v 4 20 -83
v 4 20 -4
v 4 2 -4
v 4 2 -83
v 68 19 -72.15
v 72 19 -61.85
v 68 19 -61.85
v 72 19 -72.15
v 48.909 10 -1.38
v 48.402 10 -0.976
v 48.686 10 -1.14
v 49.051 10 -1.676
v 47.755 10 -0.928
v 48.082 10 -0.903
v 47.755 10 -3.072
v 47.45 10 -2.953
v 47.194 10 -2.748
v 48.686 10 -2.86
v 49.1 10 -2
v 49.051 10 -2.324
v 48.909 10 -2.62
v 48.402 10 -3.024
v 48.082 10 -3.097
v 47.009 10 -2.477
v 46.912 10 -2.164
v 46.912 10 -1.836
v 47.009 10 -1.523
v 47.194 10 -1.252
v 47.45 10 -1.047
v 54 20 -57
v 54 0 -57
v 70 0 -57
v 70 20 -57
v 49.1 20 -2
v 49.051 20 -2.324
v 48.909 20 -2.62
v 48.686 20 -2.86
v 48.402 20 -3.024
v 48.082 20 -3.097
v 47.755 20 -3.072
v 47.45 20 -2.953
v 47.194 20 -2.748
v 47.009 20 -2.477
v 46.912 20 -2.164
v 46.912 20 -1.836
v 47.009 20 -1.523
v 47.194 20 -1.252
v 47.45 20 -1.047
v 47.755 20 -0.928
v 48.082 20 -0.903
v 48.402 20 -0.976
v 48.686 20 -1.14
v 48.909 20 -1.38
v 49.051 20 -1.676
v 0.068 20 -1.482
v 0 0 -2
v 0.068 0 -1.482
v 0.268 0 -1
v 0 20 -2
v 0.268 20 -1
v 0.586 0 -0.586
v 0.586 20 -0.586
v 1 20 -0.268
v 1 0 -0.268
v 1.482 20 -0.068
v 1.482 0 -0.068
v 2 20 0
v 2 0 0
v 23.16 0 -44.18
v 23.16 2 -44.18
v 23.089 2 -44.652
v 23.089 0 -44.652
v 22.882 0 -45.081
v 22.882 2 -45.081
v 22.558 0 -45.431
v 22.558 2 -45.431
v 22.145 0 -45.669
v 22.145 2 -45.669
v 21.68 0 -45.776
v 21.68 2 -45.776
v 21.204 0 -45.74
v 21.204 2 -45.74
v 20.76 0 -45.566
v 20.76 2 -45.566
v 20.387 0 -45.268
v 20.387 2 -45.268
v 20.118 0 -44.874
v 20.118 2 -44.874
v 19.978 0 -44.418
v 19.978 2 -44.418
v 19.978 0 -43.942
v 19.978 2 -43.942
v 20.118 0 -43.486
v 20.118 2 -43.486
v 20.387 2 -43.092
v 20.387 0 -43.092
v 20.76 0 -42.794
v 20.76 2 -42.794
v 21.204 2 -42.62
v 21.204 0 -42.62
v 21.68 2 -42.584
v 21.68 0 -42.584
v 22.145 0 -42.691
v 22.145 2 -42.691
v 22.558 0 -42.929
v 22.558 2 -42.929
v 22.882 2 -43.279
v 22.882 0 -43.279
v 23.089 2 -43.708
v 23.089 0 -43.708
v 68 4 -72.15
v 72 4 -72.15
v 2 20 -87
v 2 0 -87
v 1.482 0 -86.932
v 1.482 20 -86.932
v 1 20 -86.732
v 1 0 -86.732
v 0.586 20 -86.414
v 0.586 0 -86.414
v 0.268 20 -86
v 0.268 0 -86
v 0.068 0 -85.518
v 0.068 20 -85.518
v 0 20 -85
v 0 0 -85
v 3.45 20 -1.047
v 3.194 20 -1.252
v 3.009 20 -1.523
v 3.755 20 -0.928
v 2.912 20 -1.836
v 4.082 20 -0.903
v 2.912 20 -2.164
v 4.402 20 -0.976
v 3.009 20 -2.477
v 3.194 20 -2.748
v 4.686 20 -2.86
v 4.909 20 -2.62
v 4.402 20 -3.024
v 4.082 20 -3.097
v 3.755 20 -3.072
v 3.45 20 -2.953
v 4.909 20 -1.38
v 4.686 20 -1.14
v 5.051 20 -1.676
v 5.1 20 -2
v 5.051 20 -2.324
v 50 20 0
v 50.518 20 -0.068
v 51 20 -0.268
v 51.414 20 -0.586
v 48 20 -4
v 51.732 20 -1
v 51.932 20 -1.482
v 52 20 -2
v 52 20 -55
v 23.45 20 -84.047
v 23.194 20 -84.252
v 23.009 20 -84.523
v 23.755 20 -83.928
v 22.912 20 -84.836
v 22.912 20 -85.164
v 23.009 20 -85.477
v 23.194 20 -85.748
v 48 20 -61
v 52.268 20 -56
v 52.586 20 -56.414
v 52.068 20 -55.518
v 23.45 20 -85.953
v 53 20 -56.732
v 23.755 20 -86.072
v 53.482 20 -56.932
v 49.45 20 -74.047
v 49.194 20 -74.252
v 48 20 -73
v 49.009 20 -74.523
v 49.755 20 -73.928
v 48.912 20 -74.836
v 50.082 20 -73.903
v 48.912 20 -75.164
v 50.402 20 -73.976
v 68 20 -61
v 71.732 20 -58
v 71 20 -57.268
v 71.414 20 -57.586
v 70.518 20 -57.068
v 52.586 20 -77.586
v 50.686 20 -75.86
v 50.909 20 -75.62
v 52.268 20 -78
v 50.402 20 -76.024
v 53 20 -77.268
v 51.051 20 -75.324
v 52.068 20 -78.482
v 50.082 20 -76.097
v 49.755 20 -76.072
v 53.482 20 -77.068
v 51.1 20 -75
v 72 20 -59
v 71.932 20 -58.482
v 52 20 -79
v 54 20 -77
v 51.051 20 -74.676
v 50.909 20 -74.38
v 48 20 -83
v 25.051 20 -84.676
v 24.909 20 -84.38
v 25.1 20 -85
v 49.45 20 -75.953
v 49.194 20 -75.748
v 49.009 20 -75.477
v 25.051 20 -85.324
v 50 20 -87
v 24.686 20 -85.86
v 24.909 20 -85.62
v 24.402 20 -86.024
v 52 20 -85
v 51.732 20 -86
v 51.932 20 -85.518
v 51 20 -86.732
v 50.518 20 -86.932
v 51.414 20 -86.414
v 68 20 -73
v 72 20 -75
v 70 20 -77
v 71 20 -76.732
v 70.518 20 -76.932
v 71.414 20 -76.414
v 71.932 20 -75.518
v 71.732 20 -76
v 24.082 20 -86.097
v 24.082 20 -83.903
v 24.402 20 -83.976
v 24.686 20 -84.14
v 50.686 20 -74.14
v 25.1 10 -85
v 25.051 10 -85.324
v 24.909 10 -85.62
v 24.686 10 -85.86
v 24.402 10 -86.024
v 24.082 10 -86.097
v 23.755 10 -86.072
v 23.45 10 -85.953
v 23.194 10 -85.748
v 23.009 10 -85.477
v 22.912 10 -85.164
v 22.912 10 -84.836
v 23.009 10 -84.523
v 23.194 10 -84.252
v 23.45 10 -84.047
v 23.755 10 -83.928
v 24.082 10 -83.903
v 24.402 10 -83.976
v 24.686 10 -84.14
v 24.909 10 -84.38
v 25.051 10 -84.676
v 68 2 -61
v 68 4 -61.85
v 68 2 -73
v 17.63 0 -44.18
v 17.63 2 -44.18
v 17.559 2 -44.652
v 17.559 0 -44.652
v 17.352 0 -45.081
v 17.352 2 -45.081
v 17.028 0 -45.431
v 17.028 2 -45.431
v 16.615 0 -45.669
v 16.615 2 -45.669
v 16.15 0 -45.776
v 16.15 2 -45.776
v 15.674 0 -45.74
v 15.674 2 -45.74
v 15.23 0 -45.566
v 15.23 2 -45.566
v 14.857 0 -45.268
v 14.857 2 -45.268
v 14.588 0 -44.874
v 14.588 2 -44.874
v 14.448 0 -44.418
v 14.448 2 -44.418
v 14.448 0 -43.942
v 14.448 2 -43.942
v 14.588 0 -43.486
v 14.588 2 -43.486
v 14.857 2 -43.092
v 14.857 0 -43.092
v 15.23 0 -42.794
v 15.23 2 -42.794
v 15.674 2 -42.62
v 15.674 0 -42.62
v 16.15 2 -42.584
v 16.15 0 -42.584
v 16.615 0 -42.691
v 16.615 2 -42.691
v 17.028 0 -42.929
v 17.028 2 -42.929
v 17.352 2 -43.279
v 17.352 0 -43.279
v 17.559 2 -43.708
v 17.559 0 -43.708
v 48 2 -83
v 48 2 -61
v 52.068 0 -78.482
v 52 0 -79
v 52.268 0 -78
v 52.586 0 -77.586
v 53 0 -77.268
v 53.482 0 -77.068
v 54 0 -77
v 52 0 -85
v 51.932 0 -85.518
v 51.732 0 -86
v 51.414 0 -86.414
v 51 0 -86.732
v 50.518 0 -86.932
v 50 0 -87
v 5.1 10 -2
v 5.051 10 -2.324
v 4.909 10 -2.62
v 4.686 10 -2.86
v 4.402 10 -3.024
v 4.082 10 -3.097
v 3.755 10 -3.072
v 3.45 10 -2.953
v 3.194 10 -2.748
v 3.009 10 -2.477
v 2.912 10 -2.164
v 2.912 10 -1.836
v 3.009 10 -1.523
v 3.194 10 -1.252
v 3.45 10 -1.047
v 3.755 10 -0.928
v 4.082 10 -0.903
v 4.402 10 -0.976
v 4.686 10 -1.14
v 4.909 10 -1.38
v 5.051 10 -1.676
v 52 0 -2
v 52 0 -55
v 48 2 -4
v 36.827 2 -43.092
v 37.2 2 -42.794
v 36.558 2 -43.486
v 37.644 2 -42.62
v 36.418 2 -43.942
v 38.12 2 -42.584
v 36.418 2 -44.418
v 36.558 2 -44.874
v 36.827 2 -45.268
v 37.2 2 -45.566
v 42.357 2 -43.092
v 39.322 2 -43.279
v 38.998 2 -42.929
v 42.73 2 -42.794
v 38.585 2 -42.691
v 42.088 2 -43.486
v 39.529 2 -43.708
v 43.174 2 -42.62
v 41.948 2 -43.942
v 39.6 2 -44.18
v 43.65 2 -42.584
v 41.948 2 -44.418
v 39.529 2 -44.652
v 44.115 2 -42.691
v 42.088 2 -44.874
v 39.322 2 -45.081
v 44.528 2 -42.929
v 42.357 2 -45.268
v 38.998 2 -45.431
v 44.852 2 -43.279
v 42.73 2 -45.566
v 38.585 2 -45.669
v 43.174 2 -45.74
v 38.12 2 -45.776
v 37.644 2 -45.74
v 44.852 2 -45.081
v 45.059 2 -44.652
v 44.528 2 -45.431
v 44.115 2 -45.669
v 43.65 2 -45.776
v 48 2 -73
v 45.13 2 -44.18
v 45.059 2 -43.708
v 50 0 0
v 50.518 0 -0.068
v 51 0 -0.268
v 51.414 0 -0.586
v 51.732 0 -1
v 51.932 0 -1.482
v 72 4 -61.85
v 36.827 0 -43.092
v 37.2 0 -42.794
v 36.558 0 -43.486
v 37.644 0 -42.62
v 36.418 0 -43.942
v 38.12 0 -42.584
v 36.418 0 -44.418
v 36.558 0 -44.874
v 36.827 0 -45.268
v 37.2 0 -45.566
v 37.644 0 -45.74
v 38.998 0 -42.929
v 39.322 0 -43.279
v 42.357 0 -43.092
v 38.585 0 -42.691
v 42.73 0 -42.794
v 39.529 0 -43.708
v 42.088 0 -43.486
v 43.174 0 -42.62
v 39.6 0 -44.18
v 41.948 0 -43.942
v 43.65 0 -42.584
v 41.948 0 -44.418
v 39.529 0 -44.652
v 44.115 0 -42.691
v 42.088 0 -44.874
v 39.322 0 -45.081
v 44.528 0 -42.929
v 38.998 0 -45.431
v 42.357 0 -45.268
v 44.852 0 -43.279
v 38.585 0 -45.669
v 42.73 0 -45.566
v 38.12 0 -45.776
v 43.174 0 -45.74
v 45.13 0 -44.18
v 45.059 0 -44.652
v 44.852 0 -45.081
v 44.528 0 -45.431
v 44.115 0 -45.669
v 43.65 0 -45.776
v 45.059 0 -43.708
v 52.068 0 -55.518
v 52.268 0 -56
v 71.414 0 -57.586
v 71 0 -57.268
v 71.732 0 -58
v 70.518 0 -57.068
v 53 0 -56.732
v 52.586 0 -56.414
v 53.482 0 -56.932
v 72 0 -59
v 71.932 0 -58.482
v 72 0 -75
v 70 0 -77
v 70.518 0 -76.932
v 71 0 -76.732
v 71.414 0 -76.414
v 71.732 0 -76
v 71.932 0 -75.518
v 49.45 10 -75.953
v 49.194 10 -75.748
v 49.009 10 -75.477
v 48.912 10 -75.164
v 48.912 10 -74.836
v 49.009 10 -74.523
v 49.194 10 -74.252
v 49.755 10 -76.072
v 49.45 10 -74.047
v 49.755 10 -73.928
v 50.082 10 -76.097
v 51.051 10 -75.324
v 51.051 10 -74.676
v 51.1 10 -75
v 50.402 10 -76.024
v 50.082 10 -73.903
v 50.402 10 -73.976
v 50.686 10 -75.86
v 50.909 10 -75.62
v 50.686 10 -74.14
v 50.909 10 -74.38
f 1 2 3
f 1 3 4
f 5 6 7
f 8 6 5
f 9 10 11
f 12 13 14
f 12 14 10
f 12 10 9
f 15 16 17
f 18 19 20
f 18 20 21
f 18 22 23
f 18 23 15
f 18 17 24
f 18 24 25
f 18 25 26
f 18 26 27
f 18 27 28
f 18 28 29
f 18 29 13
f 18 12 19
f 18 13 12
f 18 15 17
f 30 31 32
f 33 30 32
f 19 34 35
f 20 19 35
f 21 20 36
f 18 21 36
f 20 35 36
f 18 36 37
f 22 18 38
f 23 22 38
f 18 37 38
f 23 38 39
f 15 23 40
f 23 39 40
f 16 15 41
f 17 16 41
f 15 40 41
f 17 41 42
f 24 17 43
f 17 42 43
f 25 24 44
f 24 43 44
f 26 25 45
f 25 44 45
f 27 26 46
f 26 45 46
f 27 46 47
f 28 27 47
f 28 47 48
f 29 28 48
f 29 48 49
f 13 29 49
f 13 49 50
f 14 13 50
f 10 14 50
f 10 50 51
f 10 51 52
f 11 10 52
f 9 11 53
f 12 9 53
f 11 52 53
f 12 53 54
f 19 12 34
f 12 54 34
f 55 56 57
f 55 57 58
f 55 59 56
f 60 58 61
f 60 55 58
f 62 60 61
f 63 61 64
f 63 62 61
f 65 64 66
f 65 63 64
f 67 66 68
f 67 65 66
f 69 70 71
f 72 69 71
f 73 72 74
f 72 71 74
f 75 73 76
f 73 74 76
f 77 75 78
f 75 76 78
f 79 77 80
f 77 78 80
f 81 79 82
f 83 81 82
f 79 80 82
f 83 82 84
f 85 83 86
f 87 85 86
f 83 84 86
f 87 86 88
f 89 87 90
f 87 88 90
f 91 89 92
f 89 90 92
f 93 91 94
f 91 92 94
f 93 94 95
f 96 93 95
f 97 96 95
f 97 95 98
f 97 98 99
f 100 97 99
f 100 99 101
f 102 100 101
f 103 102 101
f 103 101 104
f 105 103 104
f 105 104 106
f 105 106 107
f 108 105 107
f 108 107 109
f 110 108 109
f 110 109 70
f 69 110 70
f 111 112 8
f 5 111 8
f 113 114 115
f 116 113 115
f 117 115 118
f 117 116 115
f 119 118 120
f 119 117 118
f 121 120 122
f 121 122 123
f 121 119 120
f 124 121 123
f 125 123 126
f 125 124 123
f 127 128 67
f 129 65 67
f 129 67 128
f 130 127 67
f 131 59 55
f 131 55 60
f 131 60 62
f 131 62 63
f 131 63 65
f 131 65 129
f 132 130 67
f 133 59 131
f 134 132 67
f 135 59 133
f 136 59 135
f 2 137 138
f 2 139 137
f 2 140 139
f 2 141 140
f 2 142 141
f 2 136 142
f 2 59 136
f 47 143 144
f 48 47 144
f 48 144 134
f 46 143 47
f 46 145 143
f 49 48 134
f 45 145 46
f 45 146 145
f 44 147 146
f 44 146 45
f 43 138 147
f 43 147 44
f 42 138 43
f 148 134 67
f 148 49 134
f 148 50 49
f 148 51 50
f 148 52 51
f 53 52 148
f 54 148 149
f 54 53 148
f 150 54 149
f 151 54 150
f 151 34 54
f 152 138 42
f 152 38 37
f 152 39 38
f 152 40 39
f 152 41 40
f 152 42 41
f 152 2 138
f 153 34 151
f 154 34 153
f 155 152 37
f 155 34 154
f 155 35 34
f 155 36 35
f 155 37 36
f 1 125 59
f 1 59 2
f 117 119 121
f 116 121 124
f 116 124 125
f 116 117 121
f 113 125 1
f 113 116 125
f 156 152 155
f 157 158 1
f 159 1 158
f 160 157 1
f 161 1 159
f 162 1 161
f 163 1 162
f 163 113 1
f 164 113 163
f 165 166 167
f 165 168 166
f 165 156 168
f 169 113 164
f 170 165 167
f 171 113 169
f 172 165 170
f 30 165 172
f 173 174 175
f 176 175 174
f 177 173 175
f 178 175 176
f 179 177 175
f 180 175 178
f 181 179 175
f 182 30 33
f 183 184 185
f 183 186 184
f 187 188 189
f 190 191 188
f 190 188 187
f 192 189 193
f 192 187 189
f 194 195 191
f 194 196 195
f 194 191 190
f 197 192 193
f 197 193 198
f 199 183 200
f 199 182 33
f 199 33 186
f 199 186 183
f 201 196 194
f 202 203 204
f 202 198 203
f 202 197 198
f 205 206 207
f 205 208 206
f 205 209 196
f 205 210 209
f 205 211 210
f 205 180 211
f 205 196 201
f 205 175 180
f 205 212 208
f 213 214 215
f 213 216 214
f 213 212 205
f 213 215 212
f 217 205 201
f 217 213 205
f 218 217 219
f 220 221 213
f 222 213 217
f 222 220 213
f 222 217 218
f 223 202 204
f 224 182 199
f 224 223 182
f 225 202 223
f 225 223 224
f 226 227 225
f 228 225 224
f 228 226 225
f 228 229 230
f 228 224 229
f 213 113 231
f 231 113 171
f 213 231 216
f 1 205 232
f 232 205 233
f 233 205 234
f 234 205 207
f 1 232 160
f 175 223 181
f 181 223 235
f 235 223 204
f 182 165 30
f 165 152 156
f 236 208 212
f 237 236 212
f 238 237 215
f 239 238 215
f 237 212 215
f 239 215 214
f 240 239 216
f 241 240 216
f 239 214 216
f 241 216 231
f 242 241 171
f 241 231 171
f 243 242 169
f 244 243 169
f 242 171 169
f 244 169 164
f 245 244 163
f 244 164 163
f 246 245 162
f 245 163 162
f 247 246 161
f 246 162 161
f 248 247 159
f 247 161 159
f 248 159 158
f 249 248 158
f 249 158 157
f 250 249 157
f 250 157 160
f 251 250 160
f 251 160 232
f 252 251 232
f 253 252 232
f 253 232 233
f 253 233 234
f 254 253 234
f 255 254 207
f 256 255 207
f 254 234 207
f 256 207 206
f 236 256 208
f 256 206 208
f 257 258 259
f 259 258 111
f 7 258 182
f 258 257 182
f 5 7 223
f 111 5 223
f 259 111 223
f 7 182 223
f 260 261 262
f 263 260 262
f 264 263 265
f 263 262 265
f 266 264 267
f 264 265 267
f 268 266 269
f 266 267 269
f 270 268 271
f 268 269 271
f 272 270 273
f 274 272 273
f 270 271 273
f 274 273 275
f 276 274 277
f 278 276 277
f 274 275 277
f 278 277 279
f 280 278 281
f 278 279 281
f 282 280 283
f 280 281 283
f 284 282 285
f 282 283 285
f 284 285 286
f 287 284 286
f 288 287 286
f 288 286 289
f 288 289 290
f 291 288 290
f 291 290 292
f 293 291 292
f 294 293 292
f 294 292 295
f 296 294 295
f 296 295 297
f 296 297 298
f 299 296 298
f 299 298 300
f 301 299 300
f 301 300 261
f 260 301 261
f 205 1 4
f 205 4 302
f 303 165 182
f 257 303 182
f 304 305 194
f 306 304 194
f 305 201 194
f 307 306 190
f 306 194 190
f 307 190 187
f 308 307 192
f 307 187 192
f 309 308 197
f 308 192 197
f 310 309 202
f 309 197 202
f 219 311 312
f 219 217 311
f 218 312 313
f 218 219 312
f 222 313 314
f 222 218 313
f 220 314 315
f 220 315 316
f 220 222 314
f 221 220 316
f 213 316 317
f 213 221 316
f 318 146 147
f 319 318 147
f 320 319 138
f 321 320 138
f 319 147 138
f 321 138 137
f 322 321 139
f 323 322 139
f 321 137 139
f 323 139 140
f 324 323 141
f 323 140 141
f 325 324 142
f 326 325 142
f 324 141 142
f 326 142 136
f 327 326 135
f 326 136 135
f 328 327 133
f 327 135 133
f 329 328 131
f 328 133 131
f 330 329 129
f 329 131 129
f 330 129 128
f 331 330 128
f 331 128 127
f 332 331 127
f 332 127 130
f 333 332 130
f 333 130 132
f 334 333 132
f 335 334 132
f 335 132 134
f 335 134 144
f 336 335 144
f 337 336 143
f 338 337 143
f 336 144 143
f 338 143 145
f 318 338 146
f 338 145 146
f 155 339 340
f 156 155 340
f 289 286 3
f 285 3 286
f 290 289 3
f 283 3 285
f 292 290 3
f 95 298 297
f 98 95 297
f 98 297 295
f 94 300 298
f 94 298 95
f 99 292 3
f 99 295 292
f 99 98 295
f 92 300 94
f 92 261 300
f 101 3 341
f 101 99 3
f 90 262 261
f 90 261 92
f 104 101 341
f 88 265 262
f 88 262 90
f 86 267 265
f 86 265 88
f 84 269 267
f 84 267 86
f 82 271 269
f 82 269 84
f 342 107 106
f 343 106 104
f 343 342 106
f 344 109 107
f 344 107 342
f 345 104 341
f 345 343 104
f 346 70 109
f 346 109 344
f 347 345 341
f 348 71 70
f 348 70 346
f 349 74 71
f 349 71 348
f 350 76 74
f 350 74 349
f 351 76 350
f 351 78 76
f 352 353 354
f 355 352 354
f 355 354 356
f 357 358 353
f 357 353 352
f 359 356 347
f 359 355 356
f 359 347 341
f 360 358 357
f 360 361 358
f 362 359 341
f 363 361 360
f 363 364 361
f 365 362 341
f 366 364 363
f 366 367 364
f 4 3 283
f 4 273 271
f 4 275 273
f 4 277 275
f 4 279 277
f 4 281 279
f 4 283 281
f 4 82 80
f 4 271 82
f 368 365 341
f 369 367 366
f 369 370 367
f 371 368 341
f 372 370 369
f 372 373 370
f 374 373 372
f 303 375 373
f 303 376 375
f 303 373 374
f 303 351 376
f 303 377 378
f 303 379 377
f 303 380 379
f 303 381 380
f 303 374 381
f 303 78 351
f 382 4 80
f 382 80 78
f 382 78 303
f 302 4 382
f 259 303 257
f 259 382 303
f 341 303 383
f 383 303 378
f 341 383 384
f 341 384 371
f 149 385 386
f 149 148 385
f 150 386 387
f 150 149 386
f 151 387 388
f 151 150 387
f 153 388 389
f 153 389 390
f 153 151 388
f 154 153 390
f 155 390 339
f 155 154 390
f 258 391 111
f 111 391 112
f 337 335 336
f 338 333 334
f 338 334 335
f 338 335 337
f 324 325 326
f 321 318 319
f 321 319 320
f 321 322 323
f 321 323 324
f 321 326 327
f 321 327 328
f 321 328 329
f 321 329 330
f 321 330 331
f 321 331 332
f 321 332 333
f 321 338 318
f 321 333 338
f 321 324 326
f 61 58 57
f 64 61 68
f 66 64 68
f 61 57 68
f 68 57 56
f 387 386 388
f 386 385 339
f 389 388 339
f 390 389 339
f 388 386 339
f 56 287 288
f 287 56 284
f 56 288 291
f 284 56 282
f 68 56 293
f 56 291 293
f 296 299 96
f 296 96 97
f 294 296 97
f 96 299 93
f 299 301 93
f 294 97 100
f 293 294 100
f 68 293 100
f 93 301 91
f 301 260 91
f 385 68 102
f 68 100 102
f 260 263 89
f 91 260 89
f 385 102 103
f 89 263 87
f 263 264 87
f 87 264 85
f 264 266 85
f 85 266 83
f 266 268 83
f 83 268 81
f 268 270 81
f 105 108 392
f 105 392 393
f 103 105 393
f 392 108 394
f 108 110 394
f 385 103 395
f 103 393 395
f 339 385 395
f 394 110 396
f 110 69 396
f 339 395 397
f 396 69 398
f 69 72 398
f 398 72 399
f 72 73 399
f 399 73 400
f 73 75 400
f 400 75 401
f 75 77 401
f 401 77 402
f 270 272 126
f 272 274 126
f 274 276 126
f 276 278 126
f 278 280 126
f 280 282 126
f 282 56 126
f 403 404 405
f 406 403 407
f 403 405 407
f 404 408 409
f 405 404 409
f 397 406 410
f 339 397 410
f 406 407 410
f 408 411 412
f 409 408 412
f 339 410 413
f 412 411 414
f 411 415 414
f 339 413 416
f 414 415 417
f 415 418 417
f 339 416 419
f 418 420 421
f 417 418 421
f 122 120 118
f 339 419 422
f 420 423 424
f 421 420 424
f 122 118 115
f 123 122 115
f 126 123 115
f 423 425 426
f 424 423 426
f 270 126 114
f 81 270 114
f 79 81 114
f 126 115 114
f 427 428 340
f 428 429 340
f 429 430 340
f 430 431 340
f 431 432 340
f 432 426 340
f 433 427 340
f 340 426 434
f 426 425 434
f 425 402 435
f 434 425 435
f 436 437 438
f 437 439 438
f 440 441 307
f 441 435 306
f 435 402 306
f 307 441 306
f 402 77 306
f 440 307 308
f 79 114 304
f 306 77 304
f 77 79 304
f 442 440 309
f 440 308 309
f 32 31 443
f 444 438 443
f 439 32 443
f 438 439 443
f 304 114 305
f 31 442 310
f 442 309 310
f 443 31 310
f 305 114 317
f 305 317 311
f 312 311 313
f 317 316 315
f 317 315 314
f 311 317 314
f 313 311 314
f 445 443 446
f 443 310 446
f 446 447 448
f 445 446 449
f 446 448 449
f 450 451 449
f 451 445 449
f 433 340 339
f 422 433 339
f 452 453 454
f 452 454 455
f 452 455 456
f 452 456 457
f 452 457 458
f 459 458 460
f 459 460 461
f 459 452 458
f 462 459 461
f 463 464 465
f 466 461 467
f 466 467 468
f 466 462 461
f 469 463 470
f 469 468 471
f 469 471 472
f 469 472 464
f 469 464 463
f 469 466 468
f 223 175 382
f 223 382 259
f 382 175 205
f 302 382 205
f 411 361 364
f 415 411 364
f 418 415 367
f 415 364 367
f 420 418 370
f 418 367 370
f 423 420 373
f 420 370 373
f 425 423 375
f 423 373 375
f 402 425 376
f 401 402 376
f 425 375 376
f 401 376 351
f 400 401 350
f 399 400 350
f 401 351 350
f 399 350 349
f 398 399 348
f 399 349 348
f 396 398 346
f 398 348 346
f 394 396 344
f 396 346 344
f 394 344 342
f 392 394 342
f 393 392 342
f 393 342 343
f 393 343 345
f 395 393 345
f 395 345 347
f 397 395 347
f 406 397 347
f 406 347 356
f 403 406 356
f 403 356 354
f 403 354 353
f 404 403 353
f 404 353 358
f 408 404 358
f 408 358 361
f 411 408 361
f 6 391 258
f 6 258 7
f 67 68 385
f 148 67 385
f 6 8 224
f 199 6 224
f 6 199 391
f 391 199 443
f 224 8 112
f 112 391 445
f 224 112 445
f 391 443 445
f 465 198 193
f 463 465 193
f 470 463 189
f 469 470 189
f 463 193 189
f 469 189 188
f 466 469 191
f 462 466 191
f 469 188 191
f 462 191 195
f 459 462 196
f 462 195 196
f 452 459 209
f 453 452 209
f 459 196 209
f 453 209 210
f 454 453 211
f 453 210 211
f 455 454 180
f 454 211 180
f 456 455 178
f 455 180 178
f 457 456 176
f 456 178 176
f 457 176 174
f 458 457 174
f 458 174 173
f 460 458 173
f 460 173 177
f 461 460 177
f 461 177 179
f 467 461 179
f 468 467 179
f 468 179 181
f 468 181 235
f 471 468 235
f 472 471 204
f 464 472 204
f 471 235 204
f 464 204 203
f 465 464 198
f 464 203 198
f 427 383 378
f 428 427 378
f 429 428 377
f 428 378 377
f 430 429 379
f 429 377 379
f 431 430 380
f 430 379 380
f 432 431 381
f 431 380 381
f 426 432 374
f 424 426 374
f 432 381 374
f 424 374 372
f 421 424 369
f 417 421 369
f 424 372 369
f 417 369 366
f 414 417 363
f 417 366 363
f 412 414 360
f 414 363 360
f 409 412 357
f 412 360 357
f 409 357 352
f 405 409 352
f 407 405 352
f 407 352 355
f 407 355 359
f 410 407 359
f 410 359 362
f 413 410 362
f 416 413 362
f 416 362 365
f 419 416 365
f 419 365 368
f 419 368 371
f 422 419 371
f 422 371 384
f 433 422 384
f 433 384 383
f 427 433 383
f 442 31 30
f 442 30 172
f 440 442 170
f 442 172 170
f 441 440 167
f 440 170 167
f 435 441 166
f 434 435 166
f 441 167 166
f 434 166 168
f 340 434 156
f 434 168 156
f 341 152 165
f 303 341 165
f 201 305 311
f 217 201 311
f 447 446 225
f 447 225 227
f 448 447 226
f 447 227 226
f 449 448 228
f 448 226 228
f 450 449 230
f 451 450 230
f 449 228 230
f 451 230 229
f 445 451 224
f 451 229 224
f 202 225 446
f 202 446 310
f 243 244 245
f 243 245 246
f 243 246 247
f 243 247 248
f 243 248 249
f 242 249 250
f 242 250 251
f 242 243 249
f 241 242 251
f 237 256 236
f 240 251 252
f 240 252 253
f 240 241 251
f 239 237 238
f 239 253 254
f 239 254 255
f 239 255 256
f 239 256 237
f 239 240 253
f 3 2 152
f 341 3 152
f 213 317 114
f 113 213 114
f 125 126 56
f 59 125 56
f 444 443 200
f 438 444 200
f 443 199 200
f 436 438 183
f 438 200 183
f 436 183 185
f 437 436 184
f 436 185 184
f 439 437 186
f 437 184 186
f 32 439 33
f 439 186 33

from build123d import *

# Parameters (mm, degrees)
BOSS_EXTRUDE1_DEPTH = 20
SKETCH2_W           = 44
SKETCH2_H           = 79
BATTERY_CUT_DEPTH   = 18
SKETCH3_W           = 20
SKETCH3_H           = 12
CUT_EXTRUDE2_DEPTH  = 18
SKETCH4_R           = 1.1
NUT_HOLES_DEPTH     = 10
SKETCH5_W           = 10.3
SKETCH5_H           = 15
CUT_EXTRUDE4_DEPTH  = 5
SKETCH6_R           = 1.6
CUT_EXTRUDE5_DEPTH  = 6
FILLET1_R           = 2


with BuildPart() as part:
    # Sketch1 → Boss-Extrude1 (new body)
    with BuildSketch(Plane(origin=(0, 0, 0), x_dir=(1, 0, 0), z_dir=(0, 1, 0))):
        Polygon((52, 77), (52, 87), (0, 87), (0, 0), (52, 0), (52, 57), (72, 57), (72, 77), align=None)
    extrude(amount=BOSS_EXTRUDE1_DEPTH)

    # Sketch2 → battery cut (cut)
    with BuildSketch(Plane(origin=(0, 20, 0), x_dir=(1, 0, 0), z_dir=(0, 1, 0))):
        with Locations((26, 43.5)):
            Rectangle(SKETCH2_W, SKETCH2_H)
    extrude(amount=-BATTERY_CUT_DEPTH, mode=Mode.SUBTRACT)

    # Sketch3 → Cut-Extrude2 (cut)
    with BuildSketch(Plane(origin=(0, 20, 0), x_dir=(1, 0, 0), z_dir=(0, 1, 0))):
        with Locations((58, 67)):
            Rectangle(SKETCH3_W, SKETCH3_H)
    extrude(amount=-CUT_EXTRUDE2_DEPTH, mode=Mode.SUBTRACT)

    # Sketch4 → nut holes (cut)
    with BuildSketch(Plane(origin=(0, 20, 0), x_dir=(1, 0, 0), z_dir=(0, 1, 0))):
        with Locations((4, 2)):
            Circle(SKETCH4_R)
        with Locations((48, 2)):
            Circle(SKETCH4_R)
        with Locations((24, 85)):
            Circle(SKETCH4_R)
        with Locations((50, 75)):
            Circle(SKETCH4_R)
    extrude(amount=-NUT_HOLES_DEPTH, mode=Mode.SUBTRACT)

    # Sketch5 → Cut-Extrude4 (cut)
    with BuildSketch(Plane(origin=(72, 0, 0), x_dir=(0, 0, -1), z_dir=(1, 0, 0))):
        with Locations((67, 11.5)):
            Rectangle(SKETCH5_W, SKETCH5_H)
    extrude(amount=-CUT_EXTRUDE4_DEPTH, mode=Mode.SUBTRACT)

    # Sketch6 → Cut-Extrude5 (cut)
    with BuildSketch(Plane(origin=(0, 2, 0), x_dir=(1, 0, 0), z_dir=(0, 1, 0))):
        with Locations((21.56, 44.18)):
            Circle(SKETCH6_R)
        with Locations((43.53, 44.18)):
            Circle(SKETCH6_R)
        with Locations((38, 44.18)):
            Circle(SKETCH6_R)
        with Locations((16.03, 44.18)):
            Circle(SKETCH6_R)
    extrude(amount=-CUT_EXTRUDE5_DEPTH, mode=Mode.SUBTRACT)

    # Fillet1
    fillet1_edges = [part.edges().sort_by_distance(p)[0] for p in [
        (0, 10, -87),
        (52, 10, -87),
        (52, 10, -77),
        (72, 10, -77),
        (72, 10, -57),
        (52, 10, -57),
        (52, 10, 0),
        (0, 10, 0),
    ]]
    fillet(fillet1_edges, radius=FILLET1_R)


solid = part.part
